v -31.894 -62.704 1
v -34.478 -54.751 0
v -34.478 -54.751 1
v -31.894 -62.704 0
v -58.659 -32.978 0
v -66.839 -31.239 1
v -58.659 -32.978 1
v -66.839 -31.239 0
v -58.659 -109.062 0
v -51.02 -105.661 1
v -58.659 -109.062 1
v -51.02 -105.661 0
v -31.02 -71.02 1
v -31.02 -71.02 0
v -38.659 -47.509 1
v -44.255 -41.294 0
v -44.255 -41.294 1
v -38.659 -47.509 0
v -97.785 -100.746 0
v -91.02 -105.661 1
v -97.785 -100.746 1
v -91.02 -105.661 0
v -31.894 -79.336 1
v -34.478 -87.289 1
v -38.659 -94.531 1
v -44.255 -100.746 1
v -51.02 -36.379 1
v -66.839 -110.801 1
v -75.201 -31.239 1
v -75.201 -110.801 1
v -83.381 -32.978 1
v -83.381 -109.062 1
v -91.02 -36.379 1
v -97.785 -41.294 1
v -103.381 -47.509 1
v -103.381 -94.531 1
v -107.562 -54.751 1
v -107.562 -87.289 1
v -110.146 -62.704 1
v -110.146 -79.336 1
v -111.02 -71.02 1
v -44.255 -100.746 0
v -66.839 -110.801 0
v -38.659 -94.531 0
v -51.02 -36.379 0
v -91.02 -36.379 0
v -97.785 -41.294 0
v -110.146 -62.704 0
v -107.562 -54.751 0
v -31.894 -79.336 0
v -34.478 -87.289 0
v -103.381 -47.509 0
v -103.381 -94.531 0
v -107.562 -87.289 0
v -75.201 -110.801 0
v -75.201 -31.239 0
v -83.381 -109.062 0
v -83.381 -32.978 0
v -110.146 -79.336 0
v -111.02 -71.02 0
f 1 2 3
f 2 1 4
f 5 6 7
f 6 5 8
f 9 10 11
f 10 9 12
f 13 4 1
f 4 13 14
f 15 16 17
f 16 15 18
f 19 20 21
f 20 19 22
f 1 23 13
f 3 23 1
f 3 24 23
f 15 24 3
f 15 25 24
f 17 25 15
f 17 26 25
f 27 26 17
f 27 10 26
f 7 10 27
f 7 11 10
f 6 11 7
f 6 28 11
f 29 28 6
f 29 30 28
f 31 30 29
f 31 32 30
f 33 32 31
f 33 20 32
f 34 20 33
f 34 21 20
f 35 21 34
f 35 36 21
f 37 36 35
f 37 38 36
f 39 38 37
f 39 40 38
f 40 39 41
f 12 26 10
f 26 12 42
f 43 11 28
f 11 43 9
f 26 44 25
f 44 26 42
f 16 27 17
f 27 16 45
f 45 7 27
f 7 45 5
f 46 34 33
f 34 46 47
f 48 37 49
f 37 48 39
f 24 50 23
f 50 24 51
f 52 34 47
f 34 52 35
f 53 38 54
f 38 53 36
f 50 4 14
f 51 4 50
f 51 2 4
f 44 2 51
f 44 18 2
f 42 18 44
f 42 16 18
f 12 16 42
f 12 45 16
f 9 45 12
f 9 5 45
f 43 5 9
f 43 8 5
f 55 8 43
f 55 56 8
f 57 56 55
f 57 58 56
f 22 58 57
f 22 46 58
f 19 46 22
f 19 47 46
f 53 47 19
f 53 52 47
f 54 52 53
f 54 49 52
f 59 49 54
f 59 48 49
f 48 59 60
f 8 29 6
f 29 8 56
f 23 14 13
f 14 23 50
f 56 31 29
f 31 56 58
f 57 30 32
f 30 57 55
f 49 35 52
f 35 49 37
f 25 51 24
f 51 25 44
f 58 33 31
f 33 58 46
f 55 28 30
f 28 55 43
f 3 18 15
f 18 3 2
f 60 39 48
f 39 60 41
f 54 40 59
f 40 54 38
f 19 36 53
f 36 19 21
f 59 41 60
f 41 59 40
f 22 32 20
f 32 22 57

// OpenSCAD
red = [1,0,0, 0.7];
green = [0,1,0, 0.7];
blue = [0,0,1, 0.7];

base = 0;
base3d = [base, base, base];
lenA = 106;
lenB = 150;
lenC = 184;

scaleBy = 0.67;
scale3d = [scaleBy, scaleBy, scaleBy];

// Modules
triFace = [0, 1, 2];
quadFace = [0, 1, 2, 3];
module triangle(points, color=[0,0,0]) {
    color(color) {
        polyhedron(points, [triFace]);
    }
}

module quad(points, color=[0,0,0]) {
    color(color) {
        polyhedron(points, [quadFace]);
    }
}

// Rendering
tri1APoints = [
    [base, base, lenA],
    [base, base, lenA * 1.5], 
    [base, lenB/2, lenA * 1.5],
    [base, lenB, lenA],
];

tri1BPoints = [
    [base, base, lenA], 
    [base, base, lenA * 1.5], 
    [lenB/2, base, lenA * 1.5],
    [lenB, base, lenA],
];

tri1CPoints = [
    [base, base, lenA * 1.5], 
    [base, base, lenA * 2], 
    [base, lenB/2, lenA * 1.5]
];

tri1DPoints = [
    [base, base, lenA * 1.5], 
    [base, base, lenA * 2], 
    [lenB/2, base, lenA * 1.5],
];

tri2APoints = [
    [lenB, base, base], 
    [lenB, base, lenA], 
    [lenB, lenB, base],
];

tri2BPoints = [
    [base, lenB, base], 
    [base, lenB, lenA], 
    [lenB, lenB, base],
];

rect1APoints = [
    base3d, 
    [base, base, lenA], 
    [base, lenB, lenA],
    [base, lenB, base],
];

rect1BPoints = [
    base3d, 
    [base, base, lenA], 
    [lenB, base, lenA],
    [lenB, base, base],
];

// Rendering
scale(v=scale3d) {
rotate(a=[35,150, -78.75]) {
translate([-lenB,-lenB,0]) {
        quad(rect1APoints, red);
        quad(rect1BPoints, red);

        // triangle(tri1CPoints);
        // triangle(tri1DPoints);

        quad(tri1APoints, green);
        quad(tri1BPoints, green);

        triangle(tri2APoints, blue);
        triangle(tri2BPoints, blue);

}}}


// Pool
translate([-lenA * scaleBy , -lenA * scaleBy]) {
    cylinder(h=1, r = 40);
}


// Water - XY Plane
lenWater = 150;
colorWater = [0.2,0.8,1];
water = [
    [lenWater,lenWater],
    [-lenWater, lenWater],
    [-lenWater,-lenWater],
    [lenWater,-lenWater],
];

quad(water, colorWater);
